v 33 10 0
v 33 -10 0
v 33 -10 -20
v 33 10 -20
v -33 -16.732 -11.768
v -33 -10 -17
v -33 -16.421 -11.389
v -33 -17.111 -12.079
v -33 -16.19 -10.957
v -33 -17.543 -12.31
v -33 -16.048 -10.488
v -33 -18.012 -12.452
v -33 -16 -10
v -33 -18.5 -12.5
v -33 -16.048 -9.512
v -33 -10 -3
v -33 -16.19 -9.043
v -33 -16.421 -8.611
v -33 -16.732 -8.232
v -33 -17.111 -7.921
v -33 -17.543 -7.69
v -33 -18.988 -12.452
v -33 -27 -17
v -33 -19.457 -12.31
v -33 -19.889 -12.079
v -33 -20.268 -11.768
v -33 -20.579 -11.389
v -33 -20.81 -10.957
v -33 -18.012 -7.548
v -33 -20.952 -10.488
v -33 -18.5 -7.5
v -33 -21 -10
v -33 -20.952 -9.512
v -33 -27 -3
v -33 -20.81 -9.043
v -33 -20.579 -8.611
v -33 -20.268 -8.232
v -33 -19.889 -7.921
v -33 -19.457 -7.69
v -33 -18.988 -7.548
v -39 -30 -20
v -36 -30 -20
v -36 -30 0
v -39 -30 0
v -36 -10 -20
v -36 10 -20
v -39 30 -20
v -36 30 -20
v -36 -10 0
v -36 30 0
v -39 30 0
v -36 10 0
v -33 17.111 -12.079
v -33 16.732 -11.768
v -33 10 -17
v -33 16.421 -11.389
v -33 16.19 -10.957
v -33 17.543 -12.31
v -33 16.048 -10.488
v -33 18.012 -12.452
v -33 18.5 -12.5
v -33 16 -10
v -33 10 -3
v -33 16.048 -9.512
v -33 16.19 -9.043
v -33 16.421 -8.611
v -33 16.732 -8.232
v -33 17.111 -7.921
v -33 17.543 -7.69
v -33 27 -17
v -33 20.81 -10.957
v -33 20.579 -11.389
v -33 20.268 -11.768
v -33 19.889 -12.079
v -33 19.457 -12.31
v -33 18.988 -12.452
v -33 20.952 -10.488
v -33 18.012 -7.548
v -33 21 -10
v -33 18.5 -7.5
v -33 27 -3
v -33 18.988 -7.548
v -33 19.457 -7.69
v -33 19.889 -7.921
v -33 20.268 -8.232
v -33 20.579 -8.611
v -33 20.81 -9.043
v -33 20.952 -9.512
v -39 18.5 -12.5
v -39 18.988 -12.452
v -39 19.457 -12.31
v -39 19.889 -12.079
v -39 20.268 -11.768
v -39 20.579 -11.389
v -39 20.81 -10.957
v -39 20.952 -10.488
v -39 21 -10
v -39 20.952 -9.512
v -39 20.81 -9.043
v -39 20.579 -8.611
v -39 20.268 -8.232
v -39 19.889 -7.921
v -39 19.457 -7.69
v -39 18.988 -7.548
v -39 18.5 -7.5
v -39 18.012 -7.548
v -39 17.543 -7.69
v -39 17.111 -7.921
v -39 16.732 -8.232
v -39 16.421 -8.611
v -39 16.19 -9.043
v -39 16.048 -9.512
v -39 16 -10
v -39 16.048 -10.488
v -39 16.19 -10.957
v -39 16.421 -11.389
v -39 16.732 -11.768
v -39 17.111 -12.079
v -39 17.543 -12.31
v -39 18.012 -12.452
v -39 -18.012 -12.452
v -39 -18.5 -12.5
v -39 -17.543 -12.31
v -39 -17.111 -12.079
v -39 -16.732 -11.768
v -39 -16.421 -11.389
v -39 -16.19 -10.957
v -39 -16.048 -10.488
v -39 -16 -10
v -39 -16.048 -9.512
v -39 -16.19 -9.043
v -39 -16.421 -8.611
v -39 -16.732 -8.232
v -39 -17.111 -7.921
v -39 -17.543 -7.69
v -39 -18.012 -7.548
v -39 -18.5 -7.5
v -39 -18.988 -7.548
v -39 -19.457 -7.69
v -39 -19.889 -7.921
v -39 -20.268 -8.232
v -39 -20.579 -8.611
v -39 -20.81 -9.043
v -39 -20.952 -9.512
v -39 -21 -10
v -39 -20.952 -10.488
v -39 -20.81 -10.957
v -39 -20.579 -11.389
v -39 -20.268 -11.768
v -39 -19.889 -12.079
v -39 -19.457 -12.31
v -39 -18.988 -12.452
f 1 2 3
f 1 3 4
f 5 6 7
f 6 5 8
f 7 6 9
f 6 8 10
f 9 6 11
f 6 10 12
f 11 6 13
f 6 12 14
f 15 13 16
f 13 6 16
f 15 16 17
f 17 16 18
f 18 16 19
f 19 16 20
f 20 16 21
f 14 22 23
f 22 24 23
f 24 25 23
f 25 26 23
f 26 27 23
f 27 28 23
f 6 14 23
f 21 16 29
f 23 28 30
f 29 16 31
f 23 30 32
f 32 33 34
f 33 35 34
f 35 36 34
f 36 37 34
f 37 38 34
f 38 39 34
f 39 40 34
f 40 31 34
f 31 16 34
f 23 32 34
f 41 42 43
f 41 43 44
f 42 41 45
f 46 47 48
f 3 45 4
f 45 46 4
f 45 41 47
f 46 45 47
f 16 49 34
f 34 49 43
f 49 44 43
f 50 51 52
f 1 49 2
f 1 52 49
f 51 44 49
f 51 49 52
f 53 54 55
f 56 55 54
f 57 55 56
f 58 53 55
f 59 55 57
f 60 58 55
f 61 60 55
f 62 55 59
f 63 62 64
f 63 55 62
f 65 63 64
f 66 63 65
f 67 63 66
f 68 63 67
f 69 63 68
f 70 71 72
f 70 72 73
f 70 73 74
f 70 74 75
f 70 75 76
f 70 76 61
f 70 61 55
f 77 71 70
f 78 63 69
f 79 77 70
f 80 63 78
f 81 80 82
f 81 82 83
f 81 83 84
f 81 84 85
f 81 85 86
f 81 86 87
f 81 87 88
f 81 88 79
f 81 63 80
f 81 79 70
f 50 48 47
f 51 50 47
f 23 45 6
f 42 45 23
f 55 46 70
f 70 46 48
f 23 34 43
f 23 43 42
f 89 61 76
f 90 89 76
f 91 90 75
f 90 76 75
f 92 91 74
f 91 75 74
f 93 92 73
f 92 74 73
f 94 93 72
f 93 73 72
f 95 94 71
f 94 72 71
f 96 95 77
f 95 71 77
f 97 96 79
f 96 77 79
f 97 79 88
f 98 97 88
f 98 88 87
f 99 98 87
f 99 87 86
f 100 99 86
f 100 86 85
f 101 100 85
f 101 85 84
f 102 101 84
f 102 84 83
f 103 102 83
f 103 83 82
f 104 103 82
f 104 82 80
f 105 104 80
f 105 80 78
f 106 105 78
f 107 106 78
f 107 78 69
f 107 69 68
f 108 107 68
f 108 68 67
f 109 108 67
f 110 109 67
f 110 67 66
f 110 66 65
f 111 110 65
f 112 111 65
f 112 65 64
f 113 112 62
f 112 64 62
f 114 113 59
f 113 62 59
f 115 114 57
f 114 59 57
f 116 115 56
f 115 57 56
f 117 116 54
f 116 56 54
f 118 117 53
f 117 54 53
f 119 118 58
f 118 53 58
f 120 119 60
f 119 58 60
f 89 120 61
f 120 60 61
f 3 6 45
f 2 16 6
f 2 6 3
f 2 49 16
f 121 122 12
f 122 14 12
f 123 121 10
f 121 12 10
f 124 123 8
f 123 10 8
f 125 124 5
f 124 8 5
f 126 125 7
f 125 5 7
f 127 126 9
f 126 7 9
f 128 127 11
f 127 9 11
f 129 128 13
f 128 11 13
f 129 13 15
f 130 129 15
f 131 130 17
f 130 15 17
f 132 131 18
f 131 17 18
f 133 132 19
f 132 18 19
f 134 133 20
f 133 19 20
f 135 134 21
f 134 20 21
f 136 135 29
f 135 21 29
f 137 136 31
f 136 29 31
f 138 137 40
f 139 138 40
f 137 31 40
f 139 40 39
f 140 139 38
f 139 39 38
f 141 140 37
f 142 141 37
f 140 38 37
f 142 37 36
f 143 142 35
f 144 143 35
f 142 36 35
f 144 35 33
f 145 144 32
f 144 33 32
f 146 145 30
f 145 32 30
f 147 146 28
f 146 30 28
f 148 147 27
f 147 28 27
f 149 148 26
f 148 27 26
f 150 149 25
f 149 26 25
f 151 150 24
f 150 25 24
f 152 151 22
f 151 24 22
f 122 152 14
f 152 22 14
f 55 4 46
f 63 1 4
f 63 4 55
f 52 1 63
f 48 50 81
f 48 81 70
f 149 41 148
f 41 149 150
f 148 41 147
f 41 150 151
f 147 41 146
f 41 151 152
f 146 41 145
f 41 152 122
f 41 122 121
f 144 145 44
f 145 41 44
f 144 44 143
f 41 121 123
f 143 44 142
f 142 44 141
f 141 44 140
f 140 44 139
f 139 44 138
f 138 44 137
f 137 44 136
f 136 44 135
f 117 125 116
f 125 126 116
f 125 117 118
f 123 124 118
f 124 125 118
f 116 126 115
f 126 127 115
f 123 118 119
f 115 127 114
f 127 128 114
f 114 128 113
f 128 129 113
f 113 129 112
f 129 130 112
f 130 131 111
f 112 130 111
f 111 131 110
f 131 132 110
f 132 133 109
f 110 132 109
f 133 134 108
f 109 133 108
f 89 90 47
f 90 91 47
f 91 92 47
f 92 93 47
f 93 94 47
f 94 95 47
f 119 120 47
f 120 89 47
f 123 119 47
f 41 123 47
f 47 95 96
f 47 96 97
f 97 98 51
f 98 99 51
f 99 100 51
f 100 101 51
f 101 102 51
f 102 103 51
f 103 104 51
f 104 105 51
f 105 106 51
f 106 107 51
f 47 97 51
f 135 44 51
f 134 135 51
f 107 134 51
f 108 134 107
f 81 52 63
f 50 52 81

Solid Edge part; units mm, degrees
sketch "Sketch1" plane through (0, 0, 0) normal (0, 0, 1) x (1, 0, 0)
  line L0 (33, -10) -> (33, 10)
  line L1 (33, 10) -> (-33, 10)
  line L2 (-33, 10) -> (-33, 30)
  line L3 (-33, 30) -> (-39, 30)
  line L4 (-39, -30) -> (-39, 30)
  line L5 (-33, -30) -> (-39, -30)
  line L6 (-33, -10) -> (-33, -30)
  line L7 (-33, -10) -> (33, -10)
extrude "Protrusion1" add sketch "Sketch1" against normal blind 20
chamfer "Chanfro_1" distance 3 angle 45 6 edges at (-33, -20, -20) (-33, -30, -10) (-33, -20, 0) (-33, 20, -20) (-33, 30, -10) (-33, 20, 0)
hole "Furo_3" at (-33, 18.5, -10) direction (-1, 0, 0) diameter 5 end up to next
hole "Hole1" at (-33, -18.5, -10) direction (-1, 0, 0) diameter 5 end up to next
